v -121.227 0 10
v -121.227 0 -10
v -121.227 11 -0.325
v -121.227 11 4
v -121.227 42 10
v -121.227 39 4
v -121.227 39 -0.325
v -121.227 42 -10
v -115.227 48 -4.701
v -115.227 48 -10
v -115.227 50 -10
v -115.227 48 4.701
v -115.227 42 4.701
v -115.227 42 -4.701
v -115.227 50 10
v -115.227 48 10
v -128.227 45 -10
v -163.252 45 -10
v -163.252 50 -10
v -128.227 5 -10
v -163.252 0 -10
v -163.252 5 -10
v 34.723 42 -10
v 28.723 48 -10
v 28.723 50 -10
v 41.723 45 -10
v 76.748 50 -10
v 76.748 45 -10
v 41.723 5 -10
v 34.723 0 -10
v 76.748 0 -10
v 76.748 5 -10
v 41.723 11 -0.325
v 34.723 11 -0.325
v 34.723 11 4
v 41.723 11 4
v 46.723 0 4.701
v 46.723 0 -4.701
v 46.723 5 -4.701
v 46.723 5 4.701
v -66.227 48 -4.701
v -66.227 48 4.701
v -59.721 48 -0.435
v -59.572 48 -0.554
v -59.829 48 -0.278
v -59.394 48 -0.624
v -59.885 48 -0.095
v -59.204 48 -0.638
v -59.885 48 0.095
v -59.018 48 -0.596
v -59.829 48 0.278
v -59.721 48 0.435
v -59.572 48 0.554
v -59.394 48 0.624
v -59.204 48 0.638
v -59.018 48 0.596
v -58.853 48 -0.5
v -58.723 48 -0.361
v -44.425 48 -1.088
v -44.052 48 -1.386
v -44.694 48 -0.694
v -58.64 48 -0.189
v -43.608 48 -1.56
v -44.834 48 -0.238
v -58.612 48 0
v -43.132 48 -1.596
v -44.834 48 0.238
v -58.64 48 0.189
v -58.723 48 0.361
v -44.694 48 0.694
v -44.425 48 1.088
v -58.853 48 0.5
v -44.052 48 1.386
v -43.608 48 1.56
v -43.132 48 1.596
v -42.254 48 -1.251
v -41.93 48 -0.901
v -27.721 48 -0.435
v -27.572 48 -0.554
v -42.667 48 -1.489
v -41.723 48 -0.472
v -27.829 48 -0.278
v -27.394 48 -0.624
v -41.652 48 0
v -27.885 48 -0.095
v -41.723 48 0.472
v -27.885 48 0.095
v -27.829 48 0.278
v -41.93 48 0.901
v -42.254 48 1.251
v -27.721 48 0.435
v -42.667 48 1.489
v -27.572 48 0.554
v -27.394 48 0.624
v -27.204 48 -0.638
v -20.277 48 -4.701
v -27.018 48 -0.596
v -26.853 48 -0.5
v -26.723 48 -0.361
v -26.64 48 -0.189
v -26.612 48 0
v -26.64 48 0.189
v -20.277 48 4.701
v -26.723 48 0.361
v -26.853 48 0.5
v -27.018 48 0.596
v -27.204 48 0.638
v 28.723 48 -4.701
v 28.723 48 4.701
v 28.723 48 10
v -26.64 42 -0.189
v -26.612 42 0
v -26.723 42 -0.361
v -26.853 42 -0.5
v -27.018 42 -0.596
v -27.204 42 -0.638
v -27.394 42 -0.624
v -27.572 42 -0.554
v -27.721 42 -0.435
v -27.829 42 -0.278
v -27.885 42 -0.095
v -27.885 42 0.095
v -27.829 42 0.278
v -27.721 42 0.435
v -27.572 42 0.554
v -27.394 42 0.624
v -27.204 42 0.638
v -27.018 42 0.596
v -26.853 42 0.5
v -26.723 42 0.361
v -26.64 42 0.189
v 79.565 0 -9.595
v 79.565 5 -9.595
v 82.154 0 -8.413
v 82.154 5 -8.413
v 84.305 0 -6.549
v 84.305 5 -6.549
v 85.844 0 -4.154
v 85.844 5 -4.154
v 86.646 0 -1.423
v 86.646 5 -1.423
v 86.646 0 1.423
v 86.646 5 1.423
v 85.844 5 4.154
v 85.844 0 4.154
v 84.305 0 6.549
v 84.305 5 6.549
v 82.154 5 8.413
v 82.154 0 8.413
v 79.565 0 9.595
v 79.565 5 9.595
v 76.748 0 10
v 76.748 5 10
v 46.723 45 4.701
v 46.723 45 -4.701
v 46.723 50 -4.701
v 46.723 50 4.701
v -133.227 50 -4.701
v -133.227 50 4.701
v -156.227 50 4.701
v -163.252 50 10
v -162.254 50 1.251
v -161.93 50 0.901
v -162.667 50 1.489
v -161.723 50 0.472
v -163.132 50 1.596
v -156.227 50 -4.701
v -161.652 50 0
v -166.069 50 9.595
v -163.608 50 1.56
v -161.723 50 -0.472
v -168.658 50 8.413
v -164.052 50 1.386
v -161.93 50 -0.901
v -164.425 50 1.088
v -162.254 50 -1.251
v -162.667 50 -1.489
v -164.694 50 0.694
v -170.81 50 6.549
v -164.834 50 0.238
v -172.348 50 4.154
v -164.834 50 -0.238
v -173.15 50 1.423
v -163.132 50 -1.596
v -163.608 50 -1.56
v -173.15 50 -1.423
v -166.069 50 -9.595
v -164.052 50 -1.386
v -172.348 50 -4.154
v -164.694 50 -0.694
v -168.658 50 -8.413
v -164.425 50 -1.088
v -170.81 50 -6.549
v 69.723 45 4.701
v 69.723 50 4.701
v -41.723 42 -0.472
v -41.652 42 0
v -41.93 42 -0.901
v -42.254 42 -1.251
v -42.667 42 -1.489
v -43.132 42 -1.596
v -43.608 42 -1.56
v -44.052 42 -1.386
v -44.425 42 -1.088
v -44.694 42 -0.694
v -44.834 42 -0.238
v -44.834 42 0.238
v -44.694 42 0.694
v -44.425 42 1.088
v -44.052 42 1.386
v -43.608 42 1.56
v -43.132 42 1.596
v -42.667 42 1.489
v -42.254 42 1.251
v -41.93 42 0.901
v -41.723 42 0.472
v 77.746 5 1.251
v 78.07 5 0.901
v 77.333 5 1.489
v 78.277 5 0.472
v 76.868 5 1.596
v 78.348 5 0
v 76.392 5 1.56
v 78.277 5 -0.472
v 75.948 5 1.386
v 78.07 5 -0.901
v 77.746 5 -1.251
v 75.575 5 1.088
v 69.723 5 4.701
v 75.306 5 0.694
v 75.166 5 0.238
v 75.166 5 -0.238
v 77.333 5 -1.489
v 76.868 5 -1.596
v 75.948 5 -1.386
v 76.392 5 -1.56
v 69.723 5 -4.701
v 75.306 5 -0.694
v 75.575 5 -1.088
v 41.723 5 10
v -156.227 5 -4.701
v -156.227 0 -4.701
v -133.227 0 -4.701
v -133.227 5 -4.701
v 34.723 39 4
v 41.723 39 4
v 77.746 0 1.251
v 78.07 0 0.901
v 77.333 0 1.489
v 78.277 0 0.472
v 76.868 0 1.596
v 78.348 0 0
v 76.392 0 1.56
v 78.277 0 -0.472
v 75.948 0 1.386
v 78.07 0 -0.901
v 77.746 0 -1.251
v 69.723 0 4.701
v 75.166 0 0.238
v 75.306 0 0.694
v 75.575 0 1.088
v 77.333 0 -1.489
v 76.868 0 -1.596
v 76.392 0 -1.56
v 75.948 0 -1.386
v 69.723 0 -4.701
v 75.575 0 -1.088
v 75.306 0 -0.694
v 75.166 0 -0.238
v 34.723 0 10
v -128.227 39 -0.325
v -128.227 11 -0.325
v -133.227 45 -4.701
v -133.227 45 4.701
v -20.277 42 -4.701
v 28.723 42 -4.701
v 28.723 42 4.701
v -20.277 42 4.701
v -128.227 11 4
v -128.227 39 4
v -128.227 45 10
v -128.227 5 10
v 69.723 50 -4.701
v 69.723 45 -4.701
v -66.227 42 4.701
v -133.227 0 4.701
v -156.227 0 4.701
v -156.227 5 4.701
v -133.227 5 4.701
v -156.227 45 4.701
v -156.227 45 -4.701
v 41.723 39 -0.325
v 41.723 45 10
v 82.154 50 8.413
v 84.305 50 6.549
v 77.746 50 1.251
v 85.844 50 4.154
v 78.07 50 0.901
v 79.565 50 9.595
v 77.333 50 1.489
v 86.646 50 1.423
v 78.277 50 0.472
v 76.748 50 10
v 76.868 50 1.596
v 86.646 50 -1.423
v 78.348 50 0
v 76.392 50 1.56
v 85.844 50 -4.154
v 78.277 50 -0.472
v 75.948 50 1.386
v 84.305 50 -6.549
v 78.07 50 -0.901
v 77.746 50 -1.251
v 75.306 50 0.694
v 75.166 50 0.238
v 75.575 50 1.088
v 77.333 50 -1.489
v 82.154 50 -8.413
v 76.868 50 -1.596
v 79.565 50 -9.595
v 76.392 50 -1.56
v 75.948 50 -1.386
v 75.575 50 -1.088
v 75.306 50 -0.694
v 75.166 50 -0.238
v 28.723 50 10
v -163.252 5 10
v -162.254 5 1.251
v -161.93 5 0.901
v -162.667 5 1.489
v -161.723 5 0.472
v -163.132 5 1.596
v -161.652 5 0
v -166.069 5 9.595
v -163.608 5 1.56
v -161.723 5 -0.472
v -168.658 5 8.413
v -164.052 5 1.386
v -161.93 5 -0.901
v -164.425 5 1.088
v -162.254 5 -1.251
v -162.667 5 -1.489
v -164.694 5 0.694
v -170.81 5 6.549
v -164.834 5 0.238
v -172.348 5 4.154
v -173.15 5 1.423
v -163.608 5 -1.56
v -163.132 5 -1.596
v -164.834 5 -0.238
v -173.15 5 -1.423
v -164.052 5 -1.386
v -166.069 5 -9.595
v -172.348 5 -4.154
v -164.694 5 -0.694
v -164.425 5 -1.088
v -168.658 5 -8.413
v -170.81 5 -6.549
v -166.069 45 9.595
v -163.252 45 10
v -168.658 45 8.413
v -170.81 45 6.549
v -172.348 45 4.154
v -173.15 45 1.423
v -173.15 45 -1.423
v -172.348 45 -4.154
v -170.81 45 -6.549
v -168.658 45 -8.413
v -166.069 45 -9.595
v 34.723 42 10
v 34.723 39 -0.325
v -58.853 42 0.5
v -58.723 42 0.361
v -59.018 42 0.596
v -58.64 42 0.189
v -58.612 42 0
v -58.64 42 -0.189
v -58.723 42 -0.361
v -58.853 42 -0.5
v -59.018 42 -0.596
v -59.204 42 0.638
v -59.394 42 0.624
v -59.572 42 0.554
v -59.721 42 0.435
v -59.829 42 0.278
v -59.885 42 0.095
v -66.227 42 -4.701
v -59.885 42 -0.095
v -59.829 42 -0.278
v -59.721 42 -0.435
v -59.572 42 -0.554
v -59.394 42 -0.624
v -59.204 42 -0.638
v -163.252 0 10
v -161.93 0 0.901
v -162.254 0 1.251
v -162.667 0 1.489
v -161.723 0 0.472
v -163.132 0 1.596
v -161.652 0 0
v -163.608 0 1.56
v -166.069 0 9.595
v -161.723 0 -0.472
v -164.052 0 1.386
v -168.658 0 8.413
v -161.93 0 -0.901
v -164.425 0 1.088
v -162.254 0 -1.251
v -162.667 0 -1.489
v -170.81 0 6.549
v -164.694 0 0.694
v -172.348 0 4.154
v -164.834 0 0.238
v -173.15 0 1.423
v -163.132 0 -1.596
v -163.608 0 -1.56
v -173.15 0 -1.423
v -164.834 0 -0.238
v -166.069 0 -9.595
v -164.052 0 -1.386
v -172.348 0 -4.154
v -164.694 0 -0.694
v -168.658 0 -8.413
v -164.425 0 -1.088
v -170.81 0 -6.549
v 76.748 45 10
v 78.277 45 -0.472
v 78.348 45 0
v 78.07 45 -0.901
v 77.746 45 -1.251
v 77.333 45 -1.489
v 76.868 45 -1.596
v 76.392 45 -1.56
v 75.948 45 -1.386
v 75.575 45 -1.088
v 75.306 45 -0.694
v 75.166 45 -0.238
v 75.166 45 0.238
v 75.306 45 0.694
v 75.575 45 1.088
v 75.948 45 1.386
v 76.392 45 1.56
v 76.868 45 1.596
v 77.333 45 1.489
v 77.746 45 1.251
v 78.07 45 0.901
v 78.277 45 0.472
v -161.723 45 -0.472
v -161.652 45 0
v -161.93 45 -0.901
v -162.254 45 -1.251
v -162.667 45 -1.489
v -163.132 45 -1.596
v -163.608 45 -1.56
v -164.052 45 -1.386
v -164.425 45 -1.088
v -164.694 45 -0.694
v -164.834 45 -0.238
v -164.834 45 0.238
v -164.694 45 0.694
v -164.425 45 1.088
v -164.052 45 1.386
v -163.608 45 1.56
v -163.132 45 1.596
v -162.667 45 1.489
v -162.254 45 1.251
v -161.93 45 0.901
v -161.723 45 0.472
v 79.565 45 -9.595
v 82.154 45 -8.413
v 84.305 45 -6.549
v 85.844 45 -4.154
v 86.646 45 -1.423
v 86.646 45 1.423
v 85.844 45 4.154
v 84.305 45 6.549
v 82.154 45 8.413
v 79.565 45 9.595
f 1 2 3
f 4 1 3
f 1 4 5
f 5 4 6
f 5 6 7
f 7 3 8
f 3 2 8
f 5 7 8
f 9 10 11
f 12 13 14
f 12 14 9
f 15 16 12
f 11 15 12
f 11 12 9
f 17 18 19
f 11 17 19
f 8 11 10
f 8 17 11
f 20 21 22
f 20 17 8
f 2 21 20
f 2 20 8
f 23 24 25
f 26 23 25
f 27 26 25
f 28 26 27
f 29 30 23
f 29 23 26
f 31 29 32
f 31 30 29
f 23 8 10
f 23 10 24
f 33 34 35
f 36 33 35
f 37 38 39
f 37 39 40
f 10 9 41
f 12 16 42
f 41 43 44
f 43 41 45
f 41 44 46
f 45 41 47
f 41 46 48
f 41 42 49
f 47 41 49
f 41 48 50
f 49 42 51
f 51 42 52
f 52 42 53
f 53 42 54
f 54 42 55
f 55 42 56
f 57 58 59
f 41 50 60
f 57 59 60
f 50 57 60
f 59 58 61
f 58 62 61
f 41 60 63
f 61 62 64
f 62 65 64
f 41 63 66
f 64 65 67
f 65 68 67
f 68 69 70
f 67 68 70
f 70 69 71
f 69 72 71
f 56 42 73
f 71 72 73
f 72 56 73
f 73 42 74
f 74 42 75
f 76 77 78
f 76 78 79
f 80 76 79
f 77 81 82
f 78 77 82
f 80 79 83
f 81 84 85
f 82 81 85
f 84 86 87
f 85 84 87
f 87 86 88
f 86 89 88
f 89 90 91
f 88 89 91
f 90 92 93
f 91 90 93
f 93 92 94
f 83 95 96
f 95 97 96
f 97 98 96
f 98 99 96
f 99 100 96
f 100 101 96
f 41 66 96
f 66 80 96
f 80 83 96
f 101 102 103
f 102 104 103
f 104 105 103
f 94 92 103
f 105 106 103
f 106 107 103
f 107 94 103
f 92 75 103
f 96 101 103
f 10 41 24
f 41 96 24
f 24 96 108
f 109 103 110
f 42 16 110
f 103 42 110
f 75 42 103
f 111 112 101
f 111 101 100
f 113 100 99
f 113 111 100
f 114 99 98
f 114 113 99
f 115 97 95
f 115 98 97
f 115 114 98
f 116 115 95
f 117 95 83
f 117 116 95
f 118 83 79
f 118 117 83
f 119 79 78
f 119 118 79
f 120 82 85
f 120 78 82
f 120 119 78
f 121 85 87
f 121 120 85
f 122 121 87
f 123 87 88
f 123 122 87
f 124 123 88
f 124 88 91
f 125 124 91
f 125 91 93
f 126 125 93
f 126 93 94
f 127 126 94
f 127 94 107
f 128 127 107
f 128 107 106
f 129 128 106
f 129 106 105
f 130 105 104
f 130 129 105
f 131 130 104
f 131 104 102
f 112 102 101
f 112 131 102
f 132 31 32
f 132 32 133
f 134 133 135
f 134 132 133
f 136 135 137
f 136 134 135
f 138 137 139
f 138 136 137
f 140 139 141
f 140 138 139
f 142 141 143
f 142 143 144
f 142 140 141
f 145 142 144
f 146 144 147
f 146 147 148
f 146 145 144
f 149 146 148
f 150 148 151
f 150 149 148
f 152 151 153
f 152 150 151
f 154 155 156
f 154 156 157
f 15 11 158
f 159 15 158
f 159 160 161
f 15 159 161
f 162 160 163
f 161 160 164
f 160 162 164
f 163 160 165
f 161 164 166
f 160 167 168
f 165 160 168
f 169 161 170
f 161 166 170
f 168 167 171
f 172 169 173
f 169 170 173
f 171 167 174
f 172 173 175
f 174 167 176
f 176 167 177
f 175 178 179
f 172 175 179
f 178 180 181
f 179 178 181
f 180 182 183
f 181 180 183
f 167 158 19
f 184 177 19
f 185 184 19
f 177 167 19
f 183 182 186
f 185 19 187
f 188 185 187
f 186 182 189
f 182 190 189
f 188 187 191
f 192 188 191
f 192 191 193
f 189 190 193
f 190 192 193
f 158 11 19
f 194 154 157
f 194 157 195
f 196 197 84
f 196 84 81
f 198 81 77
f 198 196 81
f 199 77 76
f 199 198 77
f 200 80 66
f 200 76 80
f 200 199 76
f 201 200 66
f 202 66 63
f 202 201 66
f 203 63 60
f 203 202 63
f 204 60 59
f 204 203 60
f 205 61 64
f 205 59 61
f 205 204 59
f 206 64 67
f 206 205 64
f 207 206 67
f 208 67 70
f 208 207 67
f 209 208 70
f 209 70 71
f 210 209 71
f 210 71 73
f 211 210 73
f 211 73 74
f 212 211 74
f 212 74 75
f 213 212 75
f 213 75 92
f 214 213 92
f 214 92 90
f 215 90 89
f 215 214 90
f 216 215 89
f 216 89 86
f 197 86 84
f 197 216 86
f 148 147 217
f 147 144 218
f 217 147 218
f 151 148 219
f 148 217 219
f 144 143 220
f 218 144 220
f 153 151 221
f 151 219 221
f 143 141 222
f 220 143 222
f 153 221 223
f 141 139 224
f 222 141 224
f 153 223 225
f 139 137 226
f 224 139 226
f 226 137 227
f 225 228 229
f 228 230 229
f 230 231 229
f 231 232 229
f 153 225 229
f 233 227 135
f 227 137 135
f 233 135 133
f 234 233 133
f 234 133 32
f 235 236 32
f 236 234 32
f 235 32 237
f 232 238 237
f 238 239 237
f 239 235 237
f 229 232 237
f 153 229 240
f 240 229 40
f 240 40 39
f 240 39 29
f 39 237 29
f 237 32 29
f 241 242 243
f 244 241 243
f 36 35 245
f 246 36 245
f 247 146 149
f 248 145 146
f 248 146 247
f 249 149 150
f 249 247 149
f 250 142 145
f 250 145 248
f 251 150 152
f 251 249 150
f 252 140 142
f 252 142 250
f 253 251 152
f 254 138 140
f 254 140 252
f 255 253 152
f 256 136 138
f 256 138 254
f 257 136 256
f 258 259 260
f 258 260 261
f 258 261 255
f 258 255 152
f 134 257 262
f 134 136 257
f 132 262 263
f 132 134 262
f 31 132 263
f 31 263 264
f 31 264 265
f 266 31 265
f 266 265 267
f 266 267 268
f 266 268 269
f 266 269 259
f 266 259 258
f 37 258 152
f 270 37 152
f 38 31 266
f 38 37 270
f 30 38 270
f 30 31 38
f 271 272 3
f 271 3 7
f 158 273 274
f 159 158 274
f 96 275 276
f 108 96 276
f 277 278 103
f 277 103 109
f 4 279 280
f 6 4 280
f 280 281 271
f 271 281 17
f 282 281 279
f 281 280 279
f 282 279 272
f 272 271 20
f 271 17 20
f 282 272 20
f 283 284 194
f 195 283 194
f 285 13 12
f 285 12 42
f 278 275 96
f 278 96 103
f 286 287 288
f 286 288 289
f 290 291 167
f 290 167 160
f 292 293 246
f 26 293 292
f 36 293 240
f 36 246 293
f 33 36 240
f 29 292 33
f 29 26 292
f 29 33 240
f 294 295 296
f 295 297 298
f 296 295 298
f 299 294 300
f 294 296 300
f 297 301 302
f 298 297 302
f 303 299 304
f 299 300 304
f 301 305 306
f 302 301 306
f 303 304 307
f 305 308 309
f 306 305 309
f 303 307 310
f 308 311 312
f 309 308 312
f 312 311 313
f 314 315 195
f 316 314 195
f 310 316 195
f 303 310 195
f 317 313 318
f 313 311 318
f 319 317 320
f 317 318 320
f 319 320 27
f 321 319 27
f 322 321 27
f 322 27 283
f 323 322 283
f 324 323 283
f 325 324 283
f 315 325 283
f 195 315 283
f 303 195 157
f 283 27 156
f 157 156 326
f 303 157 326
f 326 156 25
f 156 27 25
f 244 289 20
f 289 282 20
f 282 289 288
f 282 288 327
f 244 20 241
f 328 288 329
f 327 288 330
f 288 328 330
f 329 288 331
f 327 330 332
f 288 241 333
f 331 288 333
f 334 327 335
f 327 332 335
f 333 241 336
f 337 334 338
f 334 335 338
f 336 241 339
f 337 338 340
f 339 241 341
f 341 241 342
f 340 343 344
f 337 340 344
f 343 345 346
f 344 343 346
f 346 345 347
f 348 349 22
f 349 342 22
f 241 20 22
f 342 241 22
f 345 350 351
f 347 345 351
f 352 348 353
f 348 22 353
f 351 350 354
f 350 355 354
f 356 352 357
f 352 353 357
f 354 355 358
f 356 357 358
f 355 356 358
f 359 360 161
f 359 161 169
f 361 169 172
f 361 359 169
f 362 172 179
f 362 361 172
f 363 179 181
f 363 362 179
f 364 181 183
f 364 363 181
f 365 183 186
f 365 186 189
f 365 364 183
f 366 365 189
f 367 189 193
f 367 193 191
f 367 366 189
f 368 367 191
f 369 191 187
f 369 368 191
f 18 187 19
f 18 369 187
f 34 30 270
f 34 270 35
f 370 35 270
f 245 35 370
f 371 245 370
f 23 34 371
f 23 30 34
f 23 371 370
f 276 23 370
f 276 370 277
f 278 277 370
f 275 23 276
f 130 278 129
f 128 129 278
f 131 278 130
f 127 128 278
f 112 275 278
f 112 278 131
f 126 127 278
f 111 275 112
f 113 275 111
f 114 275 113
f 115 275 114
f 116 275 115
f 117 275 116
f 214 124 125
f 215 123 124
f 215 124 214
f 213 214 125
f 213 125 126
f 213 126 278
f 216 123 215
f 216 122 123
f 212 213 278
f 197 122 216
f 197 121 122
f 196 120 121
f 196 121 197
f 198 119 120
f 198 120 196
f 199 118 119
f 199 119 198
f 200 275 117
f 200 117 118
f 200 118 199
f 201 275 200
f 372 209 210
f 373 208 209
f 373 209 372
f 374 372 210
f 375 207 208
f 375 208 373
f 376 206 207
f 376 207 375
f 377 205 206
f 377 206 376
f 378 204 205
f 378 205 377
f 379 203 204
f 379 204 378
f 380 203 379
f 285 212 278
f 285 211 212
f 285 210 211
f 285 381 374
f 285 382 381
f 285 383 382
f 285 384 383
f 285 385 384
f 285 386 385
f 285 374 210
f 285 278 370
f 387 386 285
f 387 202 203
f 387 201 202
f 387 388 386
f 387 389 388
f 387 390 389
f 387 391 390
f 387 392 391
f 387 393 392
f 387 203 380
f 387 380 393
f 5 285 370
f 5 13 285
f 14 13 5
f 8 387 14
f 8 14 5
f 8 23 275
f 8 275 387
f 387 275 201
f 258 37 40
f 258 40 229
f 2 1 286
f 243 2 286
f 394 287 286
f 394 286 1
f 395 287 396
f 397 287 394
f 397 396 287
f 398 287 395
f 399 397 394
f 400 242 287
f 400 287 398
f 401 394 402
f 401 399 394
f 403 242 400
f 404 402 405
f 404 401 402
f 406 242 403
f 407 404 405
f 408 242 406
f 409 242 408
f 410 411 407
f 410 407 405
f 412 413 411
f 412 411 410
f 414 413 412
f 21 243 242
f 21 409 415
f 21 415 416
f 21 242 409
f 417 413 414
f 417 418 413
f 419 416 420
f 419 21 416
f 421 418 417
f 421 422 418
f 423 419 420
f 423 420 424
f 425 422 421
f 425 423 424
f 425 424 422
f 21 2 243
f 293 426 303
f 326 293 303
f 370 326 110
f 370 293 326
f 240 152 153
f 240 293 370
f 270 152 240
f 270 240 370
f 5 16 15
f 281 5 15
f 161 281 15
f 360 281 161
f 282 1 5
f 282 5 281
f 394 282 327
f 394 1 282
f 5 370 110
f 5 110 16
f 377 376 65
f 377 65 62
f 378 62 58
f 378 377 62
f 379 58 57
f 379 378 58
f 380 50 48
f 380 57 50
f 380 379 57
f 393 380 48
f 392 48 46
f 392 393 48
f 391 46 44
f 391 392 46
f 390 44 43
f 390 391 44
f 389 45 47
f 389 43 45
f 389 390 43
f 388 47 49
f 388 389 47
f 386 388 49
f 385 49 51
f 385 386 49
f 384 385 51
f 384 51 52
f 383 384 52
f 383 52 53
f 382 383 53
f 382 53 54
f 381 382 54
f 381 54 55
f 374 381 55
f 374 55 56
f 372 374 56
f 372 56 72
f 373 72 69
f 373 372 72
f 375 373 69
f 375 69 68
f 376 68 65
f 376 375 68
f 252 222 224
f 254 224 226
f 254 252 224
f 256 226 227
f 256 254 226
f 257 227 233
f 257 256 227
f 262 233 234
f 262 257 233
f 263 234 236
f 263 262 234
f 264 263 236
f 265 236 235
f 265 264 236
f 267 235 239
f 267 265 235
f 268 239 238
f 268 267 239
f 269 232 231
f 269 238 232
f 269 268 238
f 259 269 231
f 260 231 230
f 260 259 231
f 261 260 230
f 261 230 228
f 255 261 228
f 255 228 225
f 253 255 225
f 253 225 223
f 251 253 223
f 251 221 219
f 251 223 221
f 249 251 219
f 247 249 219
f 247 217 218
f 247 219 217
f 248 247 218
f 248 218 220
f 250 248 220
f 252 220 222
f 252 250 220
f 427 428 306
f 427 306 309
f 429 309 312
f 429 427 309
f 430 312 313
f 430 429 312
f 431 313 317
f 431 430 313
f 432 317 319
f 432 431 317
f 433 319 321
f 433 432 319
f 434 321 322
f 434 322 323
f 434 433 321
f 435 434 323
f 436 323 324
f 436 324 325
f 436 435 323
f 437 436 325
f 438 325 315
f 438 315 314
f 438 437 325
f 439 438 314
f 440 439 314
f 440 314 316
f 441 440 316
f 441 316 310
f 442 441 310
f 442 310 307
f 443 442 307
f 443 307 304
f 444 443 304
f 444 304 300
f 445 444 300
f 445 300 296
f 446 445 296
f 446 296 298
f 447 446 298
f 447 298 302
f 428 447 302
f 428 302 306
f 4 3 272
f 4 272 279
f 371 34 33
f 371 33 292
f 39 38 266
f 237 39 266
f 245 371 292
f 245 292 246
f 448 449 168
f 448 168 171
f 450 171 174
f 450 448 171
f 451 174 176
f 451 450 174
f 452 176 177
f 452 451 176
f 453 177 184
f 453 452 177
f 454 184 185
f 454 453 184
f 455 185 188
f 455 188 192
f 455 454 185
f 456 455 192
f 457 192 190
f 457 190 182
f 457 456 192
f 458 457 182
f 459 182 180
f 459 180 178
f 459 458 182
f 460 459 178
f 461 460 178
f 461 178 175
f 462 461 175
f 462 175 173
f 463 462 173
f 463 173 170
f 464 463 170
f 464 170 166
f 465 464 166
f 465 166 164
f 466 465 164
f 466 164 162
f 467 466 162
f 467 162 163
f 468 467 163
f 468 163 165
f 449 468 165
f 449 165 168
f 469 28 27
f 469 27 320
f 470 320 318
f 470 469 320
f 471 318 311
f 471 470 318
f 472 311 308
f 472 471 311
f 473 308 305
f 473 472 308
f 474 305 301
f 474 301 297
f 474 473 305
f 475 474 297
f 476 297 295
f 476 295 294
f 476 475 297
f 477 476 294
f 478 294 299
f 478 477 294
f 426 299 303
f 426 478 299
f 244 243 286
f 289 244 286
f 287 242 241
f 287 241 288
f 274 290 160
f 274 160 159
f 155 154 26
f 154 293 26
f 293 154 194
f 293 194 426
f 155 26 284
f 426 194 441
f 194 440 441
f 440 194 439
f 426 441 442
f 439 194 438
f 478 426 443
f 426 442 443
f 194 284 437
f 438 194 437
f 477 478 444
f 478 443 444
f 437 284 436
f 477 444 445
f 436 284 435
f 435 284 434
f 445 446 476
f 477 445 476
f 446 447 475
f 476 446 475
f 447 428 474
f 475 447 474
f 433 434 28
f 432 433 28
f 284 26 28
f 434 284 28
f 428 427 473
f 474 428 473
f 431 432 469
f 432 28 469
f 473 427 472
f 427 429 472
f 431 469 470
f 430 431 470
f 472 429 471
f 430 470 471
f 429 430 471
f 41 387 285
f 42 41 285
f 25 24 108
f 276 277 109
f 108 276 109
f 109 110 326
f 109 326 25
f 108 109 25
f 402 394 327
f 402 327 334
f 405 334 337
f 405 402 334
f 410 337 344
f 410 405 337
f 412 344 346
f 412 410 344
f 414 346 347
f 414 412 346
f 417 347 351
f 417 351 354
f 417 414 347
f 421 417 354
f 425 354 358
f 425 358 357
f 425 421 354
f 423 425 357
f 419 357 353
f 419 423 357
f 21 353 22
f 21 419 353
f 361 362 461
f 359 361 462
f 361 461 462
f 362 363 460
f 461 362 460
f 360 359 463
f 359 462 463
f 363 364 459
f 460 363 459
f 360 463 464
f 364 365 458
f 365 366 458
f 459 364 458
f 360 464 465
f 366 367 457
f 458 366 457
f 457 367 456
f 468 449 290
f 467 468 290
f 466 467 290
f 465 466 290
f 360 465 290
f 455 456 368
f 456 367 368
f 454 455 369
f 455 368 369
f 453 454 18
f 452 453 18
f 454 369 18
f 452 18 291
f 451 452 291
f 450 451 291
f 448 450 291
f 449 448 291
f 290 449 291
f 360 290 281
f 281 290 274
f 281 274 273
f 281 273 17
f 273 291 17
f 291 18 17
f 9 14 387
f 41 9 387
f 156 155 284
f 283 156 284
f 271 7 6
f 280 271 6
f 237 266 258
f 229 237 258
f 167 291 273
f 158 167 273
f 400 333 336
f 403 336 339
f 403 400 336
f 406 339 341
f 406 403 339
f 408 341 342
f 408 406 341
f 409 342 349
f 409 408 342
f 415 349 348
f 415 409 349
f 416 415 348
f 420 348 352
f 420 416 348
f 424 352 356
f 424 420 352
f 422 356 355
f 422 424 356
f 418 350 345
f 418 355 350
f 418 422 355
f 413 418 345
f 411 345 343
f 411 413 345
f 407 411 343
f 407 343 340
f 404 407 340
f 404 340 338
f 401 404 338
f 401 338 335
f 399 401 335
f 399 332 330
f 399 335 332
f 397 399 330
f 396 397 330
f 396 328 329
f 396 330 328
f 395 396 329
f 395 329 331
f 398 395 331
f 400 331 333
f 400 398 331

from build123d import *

# Parameters (mm, degrees)
SKETCH_1_R          = 1.6
SKETCH_1_R_2        = 0.64
EXTRUDE_1_DEPTH     = 50
SKETCH_4_W          = 155.949110162
SKETCH_4_H          = 42
CUT_EXTRUDE_3_DEPTH = 21
SKETCH_5_W          = 23
SKETCH_5_H          = 9.401567806
SKETCH_5_W_2        = 49
CUT_EXTRUDE_4_DEPTH = 51
SKETCH_6_W          = 4.324691993
SKETCH_6_H          = 28
CUT_EXTRUDE_5_DEPTH = 215.974555081
SKETCH_7_W          = 143.949110162
SKETCH_7_H          = 2
CUT_EXTRUDE_6_DEPTH = 21


with BuildPart() as part:
    # 草图1 → 凸台-拉伸1 (new body)
    with BuildSketch(Plane(origin=(0, 0, 0), x_dir=(1, 0, 0), z_dir=(0, 1, 0))):
        with BuildLine():
            Line((-163.25203252, 10), (76.74796748, 10))
            ThreePointArc((76.74796748, 10), (86.74796748, 0), (76.74796748, -10))
            Line((76.74796748, -10), (-163.25203252, -10))
            ThreePointArc((-163.25203252, -10), (-173.25203252, 0), (-163.25203252, 10))
        make_face()
        with Locations((76.74796748, 0)):
            Circle(SKETCH_1_R, mode=Mode.SUBTRACT)
        with Locations((-163.25203252, 0)):
            Circle(SKETCH_1_R, mode=Mode.SUBTRACT)
        with Locations((-59.25203252, 0)):
            Circle(SKETCH_1_R_2, mode=Mode.SUBTRACT)
        with Locations((-43.25203252, 0)):
            Circle(SKETCH_1_R, mode=Mode.SUBTRACT)
        with Locations((-27.25203252, 0)):
            Circle(SKETCH_1_R_2, mode=Mode.SUBTRACT)
    extrude(amount=EXTRUDE_1_DEPTH)

    # 草图4 → 切除-拉伸3 (cut, through all)
    with BuildSketch(Plane(origin=(0, 0, -10), x_dir=(-1, 0, 0), z_dir=(0, 0, -1))):
        Polygon((-86.722522561, 45), (-56.74796748, 45), (-41.722522561, 45), (-41.722522561, 5), (-56.74796748, 5), (-86.74796748, 5), (-94.689865515, 5), (-94.689865515, 45), align=None)
        Polygon((128.226587601, 5), (173.25203252, 5), (178.626350661, 5), (178.626350661, 45), (173.226587601, 45), (128.226587601, 45), align=None)
        with Locations((43.25203252, 21)):
            Rectangle(SKETCH_4_W, SKETCH_4_H)
    extrude(amount=-CUT_EXTRUDE_3_DEPTH, mode=Mode.SUBTRACT)

    # 草图5 → 切除-拉伸4 (cut, through all)
    with BuildSketch(Plane.XZ):
        with Locations((58.222522561, 0)):
            Rectangle(SKETCH_5_W, SKETCH_5_H)
        with Locations((4.222522561, 0)):
            Rectangle(SKETCH_5_W_2, SKETCH_5_H)
        with Locations((-90.726587601, 0)):
            Rectangle(SKETCH_5_W_2, SKETCH_5_H)
        with Locations((-144.726587601, 0)):
            Rectangle(SKETCH_5_W, SKETCH_5_H)
    extrude(amount=-CUT_EXTRUDE_4_DEPTH, mode=Mode.SUBTRACT)

    # 草图6 → 切除-拉伸5 (cut, through all)
    with BuildSketch(Plane.ZY.offset(128.226587601)):
        with Locations((1.837654003, 25)):
            Rectangle(SKETCH_6_W, SKETCH_6_H)
    extrude(amount=-CUT_EXTRUDE_5_DEPTH, mode=Mode.SUBTRACT)

    # 草图7 → 切除-拉伸6 (cut, through all)
    with BuildSketch(Plane.XY.offset(10)):
        with Locations((-43.25203252, 49)):
            Rectangle(SKETCH_7_W, SKETCH_7_H)
    extrude(amount=-CUT_EXTRUDE_6_DEPTH, mode=Mode.SUBTRACT)


solid = part.part
